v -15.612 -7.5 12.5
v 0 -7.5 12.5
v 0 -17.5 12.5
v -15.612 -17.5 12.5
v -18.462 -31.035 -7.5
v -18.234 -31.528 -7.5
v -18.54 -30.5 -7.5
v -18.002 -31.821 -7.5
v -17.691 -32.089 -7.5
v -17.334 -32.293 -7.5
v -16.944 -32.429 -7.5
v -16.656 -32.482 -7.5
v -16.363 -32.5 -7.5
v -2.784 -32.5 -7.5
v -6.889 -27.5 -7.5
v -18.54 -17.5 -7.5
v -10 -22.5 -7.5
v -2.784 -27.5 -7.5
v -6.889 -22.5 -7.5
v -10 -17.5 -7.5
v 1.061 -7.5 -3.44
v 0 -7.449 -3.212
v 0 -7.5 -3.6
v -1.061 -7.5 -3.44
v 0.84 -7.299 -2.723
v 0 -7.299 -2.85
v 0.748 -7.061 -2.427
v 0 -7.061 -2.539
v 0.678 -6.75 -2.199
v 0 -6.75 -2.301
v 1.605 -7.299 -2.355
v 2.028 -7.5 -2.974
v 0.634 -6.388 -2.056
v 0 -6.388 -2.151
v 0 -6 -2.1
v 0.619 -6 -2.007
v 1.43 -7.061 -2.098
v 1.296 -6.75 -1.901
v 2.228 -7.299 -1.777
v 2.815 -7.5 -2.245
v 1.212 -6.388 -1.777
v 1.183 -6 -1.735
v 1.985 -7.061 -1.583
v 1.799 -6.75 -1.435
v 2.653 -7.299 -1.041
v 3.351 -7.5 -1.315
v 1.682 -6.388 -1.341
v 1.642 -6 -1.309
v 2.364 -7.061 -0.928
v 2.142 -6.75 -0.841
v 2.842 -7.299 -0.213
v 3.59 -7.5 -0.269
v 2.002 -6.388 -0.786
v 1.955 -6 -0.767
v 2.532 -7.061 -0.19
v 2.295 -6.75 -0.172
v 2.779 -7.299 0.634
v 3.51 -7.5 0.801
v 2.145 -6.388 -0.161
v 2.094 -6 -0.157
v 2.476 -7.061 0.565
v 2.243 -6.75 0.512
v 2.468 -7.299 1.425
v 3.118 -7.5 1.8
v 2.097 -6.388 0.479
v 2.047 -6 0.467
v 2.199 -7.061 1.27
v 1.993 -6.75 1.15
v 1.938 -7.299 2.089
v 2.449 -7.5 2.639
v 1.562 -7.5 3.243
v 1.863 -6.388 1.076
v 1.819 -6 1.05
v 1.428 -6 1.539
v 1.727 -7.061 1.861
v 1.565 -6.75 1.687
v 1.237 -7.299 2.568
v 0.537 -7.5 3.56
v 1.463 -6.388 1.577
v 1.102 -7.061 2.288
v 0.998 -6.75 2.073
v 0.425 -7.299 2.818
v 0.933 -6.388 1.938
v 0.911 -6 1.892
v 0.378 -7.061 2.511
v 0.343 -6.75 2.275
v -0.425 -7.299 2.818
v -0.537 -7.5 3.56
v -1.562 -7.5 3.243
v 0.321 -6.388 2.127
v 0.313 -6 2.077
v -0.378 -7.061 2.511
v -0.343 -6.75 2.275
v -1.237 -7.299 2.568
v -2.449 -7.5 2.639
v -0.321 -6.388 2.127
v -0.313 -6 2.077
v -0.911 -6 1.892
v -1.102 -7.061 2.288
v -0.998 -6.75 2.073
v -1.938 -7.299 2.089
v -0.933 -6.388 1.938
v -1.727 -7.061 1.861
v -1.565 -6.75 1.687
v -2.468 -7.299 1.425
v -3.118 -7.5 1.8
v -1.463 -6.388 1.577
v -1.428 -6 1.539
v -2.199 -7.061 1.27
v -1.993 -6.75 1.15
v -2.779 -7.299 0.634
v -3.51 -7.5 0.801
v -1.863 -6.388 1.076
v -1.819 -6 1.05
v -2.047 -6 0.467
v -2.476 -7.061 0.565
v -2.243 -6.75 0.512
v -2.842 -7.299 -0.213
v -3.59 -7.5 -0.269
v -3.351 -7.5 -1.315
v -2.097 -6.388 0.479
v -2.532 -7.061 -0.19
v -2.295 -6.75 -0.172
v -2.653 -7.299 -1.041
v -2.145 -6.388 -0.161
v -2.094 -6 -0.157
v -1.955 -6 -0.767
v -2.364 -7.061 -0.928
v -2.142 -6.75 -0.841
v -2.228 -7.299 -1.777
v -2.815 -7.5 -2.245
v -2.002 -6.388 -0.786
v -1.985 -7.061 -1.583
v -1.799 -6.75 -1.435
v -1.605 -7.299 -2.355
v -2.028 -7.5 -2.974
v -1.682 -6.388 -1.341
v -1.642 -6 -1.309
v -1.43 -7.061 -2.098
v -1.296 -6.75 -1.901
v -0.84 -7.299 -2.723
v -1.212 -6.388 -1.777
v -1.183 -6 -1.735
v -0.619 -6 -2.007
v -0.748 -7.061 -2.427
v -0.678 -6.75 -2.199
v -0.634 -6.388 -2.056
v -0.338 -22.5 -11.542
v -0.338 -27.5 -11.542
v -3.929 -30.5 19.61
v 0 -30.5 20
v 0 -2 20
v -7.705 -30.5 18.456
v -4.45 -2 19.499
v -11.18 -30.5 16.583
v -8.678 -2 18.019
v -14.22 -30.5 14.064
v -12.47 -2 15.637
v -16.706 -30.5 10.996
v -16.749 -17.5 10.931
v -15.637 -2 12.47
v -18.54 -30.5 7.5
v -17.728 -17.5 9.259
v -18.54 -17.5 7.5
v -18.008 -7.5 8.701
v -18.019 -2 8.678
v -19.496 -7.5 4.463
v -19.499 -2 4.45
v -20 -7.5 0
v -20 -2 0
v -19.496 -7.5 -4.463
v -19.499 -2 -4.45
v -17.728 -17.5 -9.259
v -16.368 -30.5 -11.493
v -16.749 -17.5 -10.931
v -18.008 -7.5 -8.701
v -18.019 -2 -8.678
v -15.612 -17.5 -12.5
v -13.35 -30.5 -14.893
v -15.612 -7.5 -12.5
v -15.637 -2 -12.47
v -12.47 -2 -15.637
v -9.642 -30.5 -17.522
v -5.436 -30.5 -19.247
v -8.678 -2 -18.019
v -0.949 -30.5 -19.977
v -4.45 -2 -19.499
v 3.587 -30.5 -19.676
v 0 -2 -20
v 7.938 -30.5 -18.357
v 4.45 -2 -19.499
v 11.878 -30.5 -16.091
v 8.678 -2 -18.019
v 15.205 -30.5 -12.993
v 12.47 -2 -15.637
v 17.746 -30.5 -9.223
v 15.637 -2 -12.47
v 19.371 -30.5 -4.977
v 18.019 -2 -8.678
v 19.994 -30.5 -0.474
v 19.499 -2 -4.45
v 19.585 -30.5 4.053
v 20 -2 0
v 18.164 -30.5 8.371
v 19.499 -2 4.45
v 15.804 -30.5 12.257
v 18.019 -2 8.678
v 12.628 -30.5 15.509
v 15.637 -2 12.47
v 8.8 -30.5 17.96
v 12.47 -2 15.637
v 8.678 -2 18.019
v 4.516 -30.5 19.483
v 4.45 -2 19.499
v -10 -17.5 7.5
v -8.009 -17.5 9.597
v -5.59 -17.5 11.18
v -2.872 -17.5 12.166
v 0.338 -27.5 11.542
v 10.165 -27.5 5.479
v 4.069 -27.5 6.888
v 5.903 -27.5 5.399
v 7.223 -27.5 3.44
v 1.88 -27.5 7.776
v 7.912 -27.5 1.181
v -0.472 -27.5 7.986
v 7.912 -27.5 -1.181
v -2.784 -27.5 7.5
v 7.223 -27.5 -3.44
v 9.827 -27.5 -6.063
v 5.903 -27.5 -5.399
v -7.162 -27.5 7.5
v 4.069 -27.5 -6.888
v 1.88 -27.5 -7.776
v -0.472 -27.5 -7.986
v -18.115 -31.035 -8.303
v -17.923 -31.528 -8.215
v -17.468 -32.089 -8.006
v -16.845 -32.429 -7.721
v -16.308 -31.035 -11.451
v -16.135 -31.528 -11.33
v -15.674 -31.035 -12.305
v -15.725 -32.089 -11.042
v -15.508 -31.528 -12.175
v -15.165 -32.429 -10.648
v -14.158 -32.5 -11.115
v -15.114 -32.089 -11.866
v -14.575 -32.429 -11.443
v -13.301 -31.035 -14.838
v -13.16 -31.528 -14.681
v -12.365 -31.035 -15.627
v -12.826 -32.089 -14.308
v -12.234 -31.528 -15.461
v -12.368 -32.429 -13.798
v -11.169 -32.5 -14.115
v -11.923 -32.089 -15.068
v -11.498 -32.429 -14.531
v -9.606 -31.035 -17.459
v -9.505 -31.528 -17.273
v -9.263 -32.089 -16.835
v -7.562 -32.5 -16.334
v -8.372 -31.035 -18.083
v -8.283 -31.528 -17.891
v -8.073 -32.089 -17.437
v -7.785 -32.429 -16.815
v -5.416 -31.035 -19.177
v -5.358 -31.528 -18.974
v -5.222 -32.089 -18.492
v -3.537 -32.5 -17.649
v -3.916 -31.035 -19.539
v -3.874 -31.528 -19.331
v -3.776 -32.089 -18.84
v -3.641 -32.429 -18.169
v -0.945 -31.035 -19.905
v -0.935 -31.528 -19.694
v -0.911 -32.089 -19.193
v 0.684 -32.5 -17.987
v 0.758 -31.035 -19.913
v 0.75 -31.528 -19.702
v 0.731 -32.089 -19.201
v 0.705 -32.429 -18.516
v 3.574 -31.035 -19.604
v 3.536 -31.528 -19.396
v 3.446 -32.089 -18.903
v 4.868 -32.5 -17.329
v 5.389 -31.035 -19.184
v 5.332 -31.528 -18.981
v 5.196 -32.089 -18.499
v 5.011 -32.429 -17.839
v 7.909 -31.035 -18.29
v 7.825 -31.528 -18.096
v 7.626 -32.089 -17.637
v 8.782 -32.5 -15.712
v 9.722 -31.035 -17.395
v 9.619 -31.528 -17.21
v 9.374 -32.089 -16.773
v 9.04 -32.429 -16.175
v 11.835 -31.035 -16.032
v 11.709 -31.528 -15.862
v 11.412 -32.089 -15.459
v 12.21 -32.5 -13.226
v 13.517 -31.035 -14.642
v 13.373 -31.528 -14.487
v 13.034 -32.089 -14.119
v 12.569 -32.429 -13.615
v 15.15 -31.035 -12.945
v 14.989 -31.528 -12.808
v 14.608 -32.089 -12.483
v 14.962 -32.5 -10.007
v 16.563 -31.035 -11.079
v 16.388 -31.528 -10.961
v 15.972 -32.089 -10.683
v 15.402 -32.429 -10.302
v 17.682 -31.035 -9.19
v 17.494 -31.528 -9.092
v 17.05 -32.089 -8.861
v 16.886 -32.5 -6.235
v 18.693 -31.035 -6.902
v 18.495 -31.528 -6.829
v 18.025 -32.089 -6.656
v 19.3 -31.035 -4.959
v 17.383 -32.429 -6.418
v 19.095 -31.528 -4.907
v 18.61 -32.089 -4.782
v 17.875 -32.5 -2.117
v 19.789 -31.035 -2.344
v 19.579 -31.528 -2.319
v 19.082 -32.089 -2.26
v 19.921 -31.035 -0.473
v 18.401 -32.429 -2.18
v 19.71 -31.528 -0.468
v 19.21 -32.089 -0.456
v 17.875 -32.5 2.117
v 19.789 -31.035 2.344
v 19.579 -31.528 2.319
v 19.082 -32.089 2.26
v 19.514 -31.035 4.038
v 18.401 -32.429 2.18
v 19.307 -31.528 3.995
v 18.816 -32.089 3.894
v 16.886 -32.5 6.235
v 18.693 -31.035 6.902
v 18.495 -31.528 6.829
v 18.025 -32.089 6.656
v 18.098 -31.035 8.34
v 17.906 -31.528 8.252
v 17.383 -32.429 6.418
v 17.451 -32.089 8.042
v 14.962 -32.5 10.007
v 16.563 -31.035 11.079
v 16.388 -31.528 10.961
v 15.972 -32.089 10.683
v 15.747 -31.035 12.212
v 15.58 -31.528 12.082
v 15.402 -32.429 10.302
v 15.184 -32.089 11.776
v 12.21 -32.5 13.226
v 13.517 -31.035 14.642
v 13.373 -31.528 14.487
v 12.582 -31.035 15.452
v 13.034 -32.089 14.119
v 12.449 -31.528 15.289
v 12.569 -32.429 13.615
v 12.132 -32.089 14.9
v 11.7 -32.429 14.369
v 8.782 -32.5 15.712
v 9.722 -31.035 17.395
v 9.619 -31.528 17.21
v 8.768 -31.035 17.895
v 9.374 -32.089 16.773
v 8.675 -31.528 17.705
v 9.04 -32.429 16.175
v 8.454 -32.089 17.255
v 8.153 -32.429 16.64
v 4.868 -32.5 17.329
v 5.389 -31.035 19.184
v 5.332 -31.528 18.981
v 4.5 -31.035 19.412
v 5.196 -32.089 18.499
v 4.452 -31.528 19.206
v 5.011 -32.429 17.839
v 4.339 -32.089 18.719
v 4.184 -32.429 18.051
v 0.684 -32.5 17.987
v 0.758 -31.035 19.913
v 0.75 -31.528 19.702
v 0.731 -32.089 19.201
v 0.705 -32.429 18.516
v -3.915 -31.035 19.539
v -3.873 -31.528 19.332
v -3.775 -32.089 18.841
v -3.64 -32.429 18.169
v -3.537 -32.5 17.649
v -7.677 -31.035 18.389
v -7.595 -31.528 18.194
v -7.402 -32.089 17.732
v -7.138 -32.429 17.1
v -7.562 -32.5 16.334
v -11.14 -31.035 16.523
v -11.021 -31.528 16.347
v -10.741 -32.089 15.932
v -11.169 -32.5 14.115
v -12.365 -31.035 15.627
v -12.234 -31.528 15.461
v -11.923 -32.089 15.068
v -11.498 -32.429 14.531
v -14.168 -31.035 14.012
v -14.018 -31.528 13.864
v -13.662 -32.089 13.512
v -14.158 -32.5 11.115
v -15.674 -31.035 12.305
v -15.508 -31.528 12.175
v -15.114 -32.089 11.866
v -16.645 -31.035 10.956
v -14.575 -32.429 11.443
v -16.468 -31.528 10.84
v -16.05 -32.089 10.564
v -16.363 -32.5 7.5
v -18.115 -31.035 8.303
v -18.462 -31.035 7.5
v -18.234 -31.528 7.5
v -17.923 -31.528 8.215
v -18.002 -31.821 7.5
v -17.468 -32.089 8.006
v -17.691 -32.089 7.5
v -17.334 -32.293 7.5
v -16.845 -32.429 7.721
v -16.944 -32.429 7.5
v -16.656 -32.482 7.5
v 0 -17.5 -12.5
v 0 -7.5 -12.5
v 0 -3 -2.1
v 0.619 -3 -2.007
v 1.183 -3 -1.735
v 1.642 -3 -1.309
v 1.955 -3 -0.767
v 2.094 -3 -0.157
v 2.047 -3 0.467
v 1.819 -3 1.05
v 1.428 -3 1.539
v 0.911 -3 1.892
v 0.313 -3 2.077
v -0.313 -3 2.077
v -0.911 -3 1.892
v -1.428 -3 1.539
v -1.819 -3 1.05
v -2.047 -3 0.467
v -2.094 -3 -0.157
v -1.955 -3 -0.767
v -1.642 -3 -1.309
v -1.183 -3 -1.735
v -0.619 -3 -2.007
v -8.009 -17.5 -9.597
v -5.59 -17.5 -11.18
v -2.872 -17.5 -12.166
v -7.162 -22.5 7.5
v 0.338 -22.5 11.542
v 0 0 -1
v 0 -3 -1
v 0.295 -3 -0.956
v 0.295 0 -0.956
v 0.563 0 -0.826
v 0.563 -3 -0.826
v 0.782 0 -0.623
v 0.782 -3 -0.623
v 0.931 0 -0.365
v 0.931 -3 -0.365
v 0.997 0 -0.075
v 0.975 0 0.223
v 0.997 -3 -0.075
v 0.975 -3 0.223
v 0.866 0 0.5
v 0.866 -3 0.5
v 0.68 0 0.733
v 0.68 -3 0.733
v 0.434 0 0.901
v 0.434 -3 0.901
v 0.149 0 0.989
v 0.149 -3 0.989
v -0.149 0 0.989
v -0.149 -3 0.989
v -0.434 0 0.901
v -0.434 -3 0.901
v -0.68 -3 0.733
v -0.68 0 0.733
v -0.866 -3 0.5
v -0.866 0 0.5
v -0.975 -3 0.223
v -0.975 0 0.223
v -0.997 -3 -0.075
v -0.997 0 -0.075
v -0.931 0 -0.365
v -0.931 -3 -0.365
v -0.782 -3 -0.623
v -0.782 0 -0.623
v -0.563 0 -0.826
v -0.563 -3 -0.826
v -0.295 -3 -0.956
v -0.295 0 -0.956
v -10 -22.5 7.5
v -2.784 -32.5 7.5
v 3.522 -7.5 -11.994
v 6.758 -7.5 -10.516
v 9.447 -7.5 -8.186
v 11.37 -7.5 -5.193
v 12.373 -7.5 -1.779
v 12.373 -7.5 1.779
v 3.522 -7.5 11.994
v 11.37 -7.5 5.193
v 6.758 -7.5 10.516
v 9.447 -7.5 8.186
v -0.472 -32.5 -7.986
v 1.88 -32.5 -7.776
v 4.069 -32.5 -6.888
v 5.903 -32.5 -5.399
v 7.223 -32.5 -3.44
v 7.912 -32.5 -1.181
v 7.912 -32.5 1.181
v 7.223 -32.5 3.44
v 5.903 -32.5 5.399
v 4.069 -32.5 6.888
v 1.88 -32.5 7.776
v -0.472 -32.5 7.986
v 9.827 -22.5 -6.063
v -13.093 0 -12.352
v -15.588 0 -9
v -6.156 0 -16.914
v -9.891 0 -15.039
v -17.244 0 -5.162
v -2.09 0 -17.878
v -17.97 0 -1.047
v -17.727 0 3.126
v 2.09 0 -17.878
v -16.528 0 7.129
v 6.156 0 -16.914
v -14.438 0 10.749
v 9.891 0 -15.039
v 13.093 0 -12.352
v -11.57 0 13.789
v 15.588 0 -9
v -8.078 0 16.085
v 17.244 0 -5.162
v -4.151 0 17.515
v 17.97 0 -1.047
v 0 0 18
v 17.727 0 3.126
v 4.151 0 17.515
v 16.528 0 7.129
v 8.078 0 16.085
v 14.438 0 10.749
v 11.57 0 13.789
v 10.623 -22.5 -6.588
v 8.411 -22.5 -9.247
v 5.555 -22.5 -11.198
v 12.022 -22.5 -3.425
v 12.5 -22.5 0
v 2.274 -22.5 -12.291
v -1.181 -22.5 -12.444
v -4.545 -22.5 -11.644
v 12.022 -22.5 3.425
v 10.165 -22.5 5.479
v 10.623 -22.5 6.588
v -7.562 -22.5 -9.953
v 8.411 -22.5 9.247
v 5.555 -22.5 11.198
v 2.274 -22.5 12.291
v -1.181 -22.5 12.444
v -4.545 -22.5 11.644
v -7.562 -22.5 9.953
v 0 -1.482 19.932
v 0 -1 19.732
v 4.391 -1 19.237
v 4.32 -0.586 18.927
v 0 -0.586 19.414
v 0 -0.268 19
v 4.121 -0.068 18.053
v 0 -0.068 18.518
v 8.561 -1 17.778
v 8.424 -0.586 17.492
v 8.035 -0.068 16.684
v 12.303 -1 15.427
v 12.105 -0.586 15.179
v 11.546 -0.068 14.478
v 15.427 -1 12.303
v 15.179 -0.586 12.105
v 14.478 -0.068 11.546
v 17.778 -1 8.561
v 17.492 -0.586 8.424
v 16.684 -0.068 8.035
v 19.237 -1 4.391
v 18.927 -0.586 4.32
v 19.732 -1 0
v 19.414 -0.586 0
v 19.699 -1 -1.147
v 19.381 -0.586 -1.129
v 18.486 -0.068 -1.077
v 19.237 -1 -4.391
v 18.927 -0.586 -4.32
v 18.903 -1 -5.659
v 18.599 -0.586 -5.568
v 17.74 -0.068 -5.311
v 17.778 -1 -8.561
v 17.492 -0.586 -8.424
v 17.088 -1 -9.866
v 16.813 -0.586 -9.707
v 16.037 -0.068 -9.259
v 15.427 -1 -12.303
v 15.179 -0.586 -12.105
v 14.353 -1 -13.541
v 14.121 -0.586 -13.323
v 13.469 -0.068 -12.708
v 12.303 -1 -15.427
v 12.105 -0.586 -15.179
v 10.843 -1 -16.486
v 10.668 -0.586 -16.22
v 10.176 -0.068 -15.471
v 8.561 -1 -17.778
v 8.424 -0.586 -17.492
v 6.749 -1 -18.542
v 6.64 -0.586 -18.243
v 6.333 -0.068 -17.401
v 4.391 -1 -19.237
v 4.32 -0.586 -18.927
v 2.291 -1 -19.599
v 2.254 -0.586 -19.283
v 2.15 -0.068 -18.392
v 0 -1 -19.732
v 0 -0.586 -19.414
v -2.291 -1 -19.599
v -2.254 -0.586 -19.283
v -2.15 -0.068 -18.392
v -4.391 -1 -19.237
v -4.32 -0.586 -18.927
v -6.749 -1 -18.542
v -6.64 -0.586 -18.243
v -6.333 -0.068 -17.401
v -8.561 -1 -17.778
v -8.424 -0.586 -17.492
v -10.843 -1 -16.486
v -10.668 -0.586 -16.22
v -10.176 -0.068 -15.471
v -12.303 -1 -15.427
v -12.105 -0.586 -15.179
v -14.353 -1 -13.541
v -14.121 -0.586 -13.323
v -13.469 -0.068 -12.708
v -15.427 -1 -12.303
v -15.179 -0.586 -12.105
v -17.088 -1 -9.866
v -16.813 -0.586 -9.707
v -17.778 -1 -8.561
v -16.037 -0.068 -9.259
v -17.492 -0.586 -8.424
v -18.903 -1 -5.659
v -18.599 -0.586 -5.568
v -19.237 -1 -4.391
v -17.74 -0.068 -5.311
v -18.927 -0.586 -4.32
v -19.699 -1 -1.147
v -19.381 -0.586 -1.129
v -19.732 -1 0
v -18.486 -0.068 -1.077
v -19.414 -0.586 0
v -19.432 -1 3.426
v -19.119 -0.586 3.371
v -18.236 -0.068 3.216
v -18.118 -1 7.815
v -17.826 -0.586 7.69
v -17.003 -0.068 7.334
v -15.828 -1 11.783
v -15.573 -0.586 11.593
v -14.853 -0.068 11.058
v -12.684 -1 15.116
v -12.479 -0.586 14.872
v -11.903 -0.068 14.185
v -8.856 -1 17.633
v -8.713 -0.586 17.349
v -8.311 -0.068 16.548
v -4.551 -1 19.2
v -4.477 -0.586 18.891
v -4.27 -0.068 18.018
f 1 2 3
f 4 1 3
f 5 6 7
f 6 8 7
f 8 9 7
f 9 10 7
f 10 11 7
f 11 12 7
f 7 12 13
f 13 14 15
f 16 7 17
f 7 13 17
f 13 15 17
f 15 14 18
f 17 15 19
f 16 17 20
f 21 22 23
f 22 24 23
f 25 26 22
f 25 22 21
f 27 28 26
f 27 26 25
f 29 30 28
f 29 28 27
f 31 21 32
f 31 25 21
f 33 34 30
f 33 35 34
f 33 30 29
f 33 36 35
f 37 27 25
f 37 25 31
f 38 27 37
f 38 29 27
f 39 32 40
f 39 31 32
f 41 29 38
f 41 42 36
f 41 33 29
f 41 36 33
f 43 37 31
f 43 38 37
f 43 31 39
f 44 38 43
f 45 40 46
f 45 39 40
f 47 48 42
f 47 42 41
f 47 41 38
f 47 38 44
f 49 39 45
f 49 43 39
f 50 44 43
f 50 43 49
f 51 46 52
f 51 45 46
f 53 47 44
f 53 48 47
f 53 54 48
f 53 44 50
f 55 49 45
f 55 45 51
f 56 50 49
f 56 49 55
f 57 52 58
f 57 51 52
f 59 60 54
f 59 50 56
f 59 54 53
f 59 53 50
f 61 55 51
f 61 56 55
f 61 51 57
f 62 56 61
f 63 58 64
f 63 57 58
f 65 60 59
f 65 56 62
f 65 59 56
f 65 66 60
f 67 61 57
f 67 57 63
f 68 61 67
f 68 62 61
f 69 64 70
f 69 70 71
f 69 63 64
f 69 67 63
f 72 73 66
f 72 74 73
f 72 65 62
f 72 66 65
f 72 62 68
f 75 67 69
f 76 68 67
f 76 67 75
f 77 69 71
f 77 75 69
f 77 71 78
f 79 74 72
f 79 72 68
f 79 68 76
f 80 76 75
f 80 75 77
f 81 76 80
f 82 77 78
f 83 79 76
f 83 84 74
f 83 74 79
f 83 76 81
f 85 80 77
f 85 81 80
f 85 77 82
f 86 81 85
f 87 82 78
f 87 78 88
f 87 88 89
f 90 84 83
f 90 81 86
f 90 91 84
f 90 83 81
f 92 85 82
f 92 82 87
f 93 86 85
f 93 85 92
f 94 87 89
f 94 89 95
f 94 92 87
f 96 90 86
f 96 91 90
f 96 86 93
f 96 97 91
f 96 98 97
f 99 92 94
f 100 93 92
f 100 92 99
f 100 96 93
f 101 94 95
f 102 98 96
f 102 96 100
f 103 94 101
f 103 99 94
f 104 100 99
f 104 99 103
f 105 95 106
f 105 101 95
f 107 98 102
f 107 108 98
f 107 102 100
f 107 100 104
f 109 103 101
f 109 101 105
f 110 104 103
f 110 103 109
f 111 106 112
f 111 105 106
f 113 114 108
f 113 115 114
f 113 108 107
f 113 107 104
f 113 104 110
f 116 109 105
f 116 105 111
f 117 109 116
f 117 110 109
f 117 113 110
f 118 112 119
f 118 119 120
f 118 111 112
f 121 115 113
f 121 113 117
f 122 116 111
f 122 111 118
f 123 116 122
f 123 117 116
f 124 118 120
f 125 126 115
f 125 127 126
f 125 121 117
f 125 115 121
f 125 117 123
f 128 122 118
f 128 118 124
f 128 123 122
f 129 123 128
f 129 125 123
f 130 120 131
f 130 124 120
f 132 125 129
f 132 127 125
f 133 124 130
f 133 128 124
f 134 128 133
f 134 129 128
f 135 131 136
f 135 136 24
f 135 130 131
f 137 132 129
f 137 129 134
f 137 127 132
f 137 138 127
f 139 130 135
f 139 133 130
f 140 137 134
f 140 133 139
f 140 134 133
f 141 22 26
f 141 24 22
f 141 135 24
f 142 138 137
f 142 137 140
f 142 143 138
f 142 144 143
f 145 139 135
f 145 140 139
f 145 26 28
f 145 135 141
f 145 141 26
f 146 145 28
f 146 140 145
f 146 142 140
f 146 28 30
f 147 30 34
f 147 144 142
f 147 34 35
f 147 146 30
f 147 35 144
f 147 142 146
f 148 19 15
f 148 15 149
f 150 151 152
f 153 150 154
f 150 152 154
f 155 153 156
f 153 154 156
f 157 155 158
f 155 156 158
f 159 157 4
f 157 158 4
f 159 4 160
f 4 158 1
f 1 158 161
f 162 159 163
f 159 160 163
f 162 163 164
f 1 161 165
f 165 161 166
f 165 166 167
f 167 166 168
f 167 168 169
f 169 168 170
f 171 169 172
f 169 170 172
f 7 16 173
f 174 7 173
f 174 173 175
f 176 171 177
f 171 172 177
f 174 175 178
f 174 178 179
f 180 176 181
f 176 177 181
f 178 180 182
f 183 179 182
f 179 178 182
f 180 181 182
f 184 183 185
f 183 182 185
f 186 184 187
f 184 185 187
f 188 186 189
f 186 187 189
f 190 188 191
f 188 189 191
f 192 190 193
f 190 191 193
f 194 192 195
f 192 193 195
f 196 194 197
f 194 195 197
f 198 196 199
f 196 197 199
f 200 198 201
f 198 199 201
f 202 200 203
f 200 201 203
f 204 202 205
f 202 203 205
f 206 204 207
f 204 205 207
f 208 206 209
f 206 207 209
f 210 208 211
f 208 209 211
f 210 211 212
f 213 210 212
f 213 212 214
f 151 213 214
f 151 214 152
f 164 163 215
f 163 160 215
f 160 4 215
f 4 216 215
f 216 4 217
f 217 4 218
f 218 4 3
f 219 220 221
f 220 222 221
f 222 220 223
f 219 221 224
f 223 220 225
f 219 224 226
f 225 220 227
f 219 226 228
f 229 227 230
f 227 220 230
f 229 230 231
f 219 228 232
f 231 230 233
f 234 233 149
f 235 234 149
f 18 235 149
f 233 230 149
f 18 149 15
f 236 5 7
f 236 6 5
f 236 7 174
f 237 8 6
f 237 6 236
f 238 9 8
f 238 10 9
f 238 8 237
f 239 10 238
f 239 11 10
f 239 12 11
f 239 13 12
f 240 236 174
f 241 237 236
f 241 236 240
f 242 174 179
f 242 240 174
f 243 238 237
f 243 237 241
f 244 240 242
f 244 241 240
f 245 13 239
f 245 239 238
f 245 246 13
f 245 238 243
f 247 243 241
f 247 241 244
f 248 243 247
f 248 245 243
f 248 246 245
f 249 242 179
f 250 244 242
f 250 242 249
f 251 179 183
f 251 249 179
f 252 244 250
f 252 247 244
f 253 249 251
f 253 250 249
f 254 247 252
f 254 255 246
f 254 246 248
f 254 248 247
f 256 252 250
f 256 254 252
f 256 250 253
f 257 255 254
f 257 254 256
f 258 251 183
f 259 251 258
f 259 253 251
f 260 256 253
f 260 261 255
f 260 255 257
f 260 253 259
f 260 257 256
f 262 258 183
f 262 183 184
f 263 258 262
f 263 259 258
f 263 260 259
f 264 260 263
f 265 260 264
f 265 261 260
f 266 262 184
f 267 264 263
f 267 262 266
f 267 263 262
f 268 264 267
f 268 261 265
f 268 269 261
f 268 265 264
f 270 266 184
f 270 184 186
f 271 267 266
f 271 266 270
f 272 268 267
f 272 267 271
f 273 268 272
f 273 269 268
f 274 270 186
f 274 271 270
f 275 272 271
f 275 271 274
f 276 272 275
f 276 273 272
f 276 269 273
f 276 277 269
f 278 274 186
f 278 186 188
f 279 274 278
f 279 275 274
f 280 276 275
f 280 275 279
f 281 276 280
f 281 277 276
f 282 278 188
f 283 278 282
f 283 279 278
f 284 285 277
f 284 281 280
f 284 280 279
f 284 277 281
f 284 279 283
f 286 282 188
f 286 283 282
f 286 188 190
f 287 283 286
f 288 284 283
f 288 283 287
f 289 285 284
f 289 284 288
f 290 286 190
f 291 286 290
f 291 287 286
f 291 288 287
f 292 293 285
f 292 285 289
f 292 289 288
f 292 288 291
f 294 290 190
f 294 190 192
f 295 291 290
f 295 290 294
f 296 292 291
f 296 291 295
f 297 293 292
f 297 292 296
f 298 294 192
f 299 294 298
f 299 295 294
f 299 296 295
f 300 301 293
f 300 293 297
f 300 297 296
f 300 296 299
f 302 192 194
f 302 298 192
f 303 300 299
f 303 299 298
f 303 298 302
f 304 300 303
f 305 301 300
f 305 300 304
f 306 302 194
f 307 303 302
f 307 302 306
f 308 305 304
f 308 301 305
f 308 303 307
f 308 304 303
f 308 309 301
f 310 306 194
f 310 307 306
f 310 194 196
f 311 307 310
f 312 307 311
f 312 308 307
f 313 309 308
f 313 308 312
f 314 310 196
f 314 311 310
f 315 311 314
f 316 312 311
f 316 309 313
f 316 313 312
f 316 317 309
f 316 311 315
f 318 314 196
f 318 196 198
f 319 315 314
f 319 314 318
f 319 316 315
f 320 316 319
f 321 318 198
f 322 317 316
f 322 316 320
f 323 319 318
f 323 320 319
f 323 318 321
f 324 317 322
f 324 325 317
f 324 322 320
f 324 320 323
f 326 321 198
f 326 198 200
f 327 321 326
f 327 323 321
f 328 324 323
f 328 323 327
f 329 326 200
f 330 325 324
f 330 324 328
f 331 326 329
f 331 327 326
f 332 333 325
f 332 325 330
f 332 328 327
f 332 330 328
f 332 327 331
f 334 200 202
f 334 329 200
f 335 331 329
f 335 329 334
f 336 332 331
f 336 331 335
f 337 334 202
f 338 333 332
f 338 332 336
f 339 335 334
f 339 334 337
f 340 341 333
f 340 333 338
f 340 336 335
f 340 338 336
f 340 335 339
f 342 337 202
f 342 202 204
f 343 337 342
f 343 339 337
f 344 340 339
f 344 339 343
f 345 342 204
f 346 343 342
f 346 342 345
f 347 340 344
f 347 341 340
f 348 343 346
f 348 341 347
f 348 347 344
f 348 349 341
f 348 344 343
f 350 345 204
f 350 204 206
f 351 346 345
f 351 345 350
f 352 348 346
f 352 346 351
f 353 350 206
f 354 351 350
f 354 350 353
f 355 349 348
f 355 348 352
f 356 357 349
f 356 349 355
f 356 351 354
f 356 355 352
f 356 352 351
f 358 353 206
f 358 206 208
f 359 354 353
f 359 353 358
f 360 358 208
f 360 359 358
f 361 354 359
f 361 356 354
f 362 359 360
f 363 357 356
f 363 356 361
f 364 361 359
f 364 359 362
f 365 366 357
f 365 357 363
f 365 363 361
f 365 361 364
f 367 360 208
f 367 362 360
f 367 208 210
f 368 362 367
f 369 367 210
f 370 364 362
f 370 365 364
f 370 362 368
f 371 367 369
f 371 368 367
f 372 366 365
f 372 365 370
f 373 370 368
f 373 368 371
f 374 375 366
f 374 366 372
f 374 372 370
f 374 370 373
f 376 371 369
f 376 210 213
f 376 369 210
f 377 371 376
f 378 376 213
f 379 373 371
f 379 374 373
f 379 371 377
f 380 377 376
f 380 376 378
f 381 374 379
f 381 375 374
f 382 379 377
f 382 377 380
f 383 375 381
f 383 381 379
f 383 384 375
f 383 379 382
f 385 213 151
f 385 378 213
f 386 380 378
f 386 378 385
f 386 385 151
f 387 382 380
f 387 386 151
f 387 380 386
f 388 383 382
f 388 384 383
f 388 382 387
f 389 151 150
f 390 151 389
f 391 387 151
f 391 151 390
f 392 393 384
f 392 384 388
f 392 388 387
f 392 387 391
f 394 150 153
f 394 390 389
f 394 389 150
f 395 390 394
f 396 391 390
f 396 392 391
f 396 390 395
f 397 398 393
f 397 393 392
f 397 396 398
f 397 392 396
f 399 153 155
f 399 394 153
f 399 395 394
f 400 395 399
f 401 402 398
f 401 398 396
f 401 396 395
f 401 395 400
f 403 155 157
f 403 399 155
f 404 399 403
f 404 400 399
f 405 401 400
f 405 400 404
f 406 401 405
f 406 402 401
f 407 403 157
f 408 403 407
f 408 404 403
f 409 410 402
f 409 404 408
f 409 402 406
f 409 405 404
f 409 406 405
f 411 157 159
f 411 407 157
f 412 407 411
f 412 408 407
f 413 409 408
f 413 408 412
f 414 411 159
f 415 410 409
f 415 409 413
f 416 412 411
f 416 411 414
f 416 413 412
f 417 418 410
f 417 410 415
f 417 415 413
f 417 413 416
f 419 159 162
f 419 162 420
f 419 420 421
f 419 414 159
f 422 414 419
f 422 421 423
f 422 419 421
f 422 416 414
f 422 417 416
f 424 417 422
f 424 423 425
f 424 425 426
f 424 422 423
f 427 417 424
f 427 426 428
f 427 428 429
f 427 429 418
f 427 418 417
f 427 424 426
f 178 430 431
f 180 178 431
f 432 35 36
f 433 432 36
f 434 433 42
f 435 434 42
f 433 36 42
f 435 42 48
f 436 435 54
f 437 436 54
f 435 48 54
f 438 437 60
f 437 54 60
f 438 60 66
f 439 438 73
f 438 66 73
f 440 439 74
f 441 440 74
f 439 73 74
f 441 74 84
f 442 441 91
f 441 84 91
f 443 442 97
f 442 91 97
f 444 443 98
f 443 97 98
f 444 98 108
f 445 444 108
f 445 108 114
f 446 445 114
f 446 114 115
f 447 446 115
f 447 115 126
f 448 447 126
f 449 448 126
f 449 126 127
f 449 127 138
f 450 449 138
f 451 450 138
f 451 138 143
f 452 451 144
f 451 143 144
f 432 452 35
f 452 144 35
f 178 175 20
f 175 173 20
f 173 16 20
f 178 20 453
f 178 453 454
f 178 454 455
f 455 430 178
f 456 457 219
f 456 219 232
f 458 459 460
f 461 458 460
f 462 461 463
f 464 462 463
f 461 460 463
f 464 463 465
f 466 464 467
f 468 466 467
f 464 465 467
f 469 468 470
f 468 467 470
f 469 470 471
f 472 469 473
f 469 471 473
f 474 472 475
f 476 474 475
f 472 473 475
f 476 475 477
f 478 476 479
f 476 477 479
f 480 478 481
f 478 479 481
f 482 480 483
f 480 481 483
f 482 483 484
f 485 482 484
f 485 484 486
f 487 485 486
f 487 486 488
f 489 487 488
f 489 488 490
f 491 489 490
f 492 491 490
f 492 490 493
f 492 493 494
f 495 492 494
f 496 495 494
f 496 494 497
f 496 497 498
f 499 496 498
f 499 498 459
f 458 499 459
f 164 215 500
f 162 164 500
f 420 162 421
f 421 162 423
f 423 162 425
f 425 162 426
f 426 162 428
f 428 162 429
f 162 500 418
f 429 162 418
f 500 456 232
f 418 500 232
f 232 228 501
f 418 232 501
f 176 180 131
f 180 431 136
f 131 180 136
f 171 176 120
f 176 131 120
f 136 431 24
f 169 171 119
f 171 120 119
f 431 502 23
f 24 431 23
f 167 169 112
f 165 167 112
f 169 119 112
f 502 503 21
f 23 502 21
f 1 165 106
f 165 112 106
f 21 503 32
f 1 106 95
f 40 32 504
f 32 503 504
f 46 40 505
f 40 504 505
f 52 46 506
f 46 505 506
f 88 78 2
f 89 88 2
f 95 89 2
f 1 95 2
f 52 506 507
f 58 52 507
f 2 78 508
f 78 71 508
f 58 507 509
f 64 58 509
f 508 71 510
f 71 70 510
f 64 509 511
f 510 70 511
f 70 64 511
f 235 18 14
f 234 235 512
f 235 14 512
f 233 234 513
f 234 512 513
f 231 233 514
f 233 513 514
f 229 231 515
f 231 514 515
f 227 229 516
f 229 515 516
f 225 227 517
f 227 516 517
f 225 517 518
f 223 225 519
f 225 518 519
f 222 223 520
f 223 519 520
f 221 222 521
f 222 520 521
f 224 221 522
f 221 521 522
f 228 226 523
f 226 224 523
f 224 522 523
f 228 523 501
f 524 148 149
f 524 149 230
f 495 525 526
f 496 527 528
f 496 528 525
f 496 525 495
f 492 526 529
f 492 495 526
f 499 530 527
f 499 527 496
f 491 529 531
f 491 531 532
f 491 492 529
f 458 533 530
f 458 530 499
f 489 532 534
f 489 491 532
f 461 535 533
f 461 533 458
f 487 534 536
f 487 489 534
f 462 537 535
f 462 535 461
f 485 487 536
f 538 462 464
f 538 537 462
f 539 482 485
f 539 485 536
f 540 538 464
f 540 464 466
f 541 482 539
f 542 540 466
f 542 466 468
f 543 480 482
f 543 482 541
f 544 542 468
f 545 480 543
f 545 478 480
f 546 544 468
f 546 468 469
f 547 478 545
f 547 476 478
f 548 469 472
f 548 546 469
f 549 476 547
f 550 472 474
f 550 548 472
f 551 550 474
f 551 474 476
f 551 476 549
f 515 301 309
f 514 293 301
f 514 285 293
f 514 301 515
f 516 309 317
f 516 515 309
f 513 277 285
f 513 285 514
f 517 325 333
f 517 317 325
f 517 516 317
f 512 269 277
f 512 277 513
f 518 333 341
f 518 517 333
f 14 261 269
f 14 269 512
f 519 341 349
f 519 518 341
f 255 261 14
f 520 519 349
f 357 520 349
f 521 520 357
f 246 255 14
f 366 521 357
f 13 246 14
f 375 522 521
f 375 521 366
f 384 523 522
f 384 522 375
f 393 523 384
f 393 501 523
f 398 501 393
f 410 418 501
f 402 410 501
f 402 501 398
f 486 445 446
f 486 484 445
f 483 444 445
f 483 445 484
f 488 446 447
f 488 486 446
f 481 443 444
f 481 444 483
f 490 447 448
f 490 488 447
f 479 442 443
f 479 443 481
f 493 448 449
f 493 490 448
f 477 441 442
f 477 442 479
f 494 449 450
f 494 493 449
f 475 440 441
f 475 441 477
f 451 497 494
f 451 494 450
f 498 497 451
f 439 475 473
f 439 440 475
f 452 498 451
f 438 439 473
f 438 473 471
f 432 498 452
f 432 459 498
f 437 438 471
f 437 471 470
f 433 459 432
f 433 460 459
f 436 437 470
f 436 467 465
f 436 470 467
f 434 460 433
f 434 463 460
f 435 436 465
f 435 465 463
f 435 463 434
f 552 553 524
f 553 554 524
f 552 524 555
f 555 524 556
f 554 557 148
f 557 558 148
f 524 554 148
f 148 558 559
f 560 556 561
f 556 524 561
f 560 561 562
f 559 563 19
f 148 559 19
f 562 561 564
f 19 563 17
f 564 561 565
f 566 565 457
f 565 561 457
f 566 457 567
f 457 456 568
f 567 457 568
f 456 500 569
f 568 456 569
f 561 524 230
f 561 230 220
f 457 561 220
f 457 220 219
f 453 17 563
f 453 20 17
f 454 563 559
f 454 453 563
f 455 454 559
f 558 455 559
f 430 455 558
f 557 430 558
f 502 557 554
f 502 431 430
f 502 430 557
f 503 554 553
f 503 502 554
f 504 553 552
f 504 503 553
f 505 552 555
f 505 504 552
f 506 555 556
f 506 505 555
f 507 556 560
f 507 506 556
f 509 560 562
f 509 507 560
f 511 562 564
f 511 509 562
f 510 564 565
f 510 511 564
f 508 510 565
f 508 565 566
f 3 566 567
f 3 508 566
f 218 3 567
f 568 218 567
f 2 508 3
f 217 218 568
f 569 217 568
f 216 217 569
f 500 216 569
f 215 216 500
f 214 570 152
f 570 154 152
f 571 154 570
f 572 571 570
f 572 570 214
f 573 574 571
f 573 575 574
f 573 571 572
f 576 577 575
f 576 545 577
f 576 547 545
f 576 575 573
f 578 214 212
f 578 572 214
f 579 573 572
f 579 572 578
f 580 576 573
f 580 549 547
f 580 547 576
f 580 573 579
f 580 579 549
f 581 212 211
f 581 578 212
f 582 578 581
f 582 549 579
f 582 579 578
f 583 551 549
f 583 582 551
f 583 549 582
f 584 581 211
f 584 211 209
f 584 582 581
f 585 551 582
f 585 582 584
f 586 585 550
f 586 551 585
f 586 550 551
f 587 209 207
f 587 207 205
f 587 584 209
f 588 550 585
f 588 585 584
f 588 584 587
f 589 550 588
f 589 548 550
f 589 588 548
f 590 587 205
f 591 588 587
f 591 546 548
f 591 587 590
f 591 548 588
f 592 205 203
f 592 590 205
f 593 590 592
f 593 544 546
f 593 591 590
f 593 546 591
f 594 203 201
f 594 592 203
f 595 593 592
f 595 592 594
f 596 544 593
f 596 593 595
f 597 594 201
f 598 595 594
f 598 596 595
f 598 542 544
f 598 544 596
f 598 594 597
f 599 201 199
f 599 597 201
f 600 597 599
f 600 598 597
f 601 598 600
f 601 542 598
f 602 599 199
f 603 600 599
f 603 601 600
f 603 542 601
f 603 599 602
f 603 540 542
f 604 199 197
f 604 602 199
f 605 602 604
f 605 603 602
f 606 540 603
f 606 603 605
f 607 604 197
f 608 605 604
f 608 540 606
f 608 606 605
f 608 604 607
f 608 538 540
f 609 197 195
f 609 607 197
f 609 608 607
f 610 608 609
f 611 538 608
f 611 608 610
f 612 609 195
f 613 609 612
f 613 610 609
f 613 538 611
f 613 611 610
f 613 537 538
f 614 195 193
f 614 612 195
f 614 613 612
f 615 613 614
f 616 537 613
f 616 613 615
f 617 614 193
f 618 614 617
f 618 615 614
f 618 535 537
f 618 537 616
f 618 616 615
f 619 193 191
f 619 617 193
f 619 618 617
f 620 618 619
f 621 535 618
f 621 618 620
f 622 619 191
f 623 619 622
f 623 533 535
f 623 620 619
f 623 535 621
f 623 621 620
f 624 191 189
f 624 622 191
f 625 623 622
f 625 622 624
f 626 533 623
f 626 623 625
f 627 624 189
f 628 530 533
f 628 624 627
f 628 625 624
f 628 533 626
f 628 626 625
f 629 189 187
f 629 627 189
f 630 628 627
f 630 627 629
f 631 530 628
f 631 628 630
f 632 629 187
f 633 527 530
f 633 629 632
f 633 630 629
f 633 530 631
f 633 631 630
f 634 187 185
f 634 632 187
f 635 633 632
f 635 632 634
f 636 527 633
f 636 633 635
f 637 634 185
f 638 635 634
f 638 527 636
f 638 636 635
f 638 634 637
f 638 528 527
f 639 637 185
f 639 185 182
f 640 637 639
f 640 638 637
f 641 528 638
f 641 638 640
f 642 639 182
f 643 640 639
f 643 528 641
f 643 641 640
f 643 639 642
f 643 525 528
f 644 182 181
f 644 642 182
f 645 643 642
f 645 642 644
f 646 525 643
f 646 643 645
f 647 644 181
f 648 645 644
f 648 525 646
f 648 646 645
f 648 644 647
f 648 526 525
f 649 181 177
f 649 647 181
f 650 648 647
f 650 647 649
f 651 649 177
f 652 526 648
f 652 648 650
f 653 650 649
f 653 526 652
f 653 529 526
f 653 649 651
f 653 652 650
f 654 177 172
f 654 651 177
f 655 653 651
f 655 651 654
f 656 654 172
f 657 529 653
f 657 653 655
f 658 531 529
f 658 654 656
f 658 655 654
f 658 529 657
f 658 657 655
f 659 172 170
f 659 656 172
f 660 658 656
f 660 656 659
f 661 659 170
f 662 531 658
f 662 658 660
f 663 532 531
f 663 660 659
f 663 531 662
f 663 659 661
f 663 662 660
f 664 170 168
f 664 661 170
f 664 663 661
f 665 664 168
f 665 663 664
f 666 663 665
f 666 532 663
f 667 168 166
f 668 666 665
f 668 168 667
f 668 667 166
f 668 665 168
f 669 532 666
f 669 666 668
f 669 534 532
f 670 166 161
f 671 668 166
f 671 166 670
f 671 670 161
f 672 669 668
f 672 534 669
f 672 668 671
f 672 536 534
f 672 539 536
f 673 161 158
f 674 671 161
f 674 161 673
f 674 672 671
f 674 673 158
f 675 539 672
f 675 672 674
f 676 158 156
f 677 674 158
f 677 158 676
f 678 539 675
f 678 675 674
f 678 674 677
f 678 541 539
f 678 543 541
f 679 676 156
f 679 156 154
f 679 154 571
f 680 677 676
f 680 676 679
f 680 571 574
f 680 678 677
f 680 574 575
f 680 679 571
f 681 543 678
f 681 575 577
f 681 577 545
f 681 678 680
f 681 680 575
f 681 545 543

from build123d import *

# Parameters (mm, degrees)
SKETCH1_R           = 20
BOSS_EXTRUDE1_DEPTH = 7.5
SKETCH2_R           = 20
SKETCH2_R_2         = 12.5
BOSS_EXTRUDE2_DEPTH = 15
SKETCH3_R           = 20
BOSS_EXTRUDE3_DEPTH = 10
CUT_EXTRUDE2_DEPTH  = 5
CUT_EXTRUDE3_DEPTH  = 44.084219849
SKETCH6_R           = 8
CUT_EXTRUDE4_DEPTH  = 5
SKETCH7_R           = 2.1
CUT_EXTRUDE5_DEPTH  = 4.5
SKETCH8_R           = 1
CUT_EXTRUDE6_DEPTH  = 41.868692174
FILLET1_R           = 1.5
FILLET2_R           = 2


with BuildPart() as part:
    # Sketch1 → Boss-Extrude1 (new body)
    with BuildSketch(Plane(origin=(0, 0, 0), x_dir=(1, 0, 0), z_dir=(0, 1, 0))):
        with Locations(Location((0, 0, 0), (0, 0, 270))):
            Circle(SKETCH1_R)
    extrude(amount=-BOSS_EXTRUDE1_DEPTH)

    # Sketch2 → Boss-Extrude2 (add)
    with BuildSketch(Plane.XZ.offset(7.5)):
        with Locations(Location((0, 0, 0), (0, 0, 90))):
            Circle(SKETCH2_R)
        with Locations(Location((0, 0, 0), (0, 0, 270))):
            Circle(SKETCH2_R_2, mode=Mode.SUBTRACT)
    extrude(amount=BOSS_EXTRUDE2_DEPTH)

    # Sketch3 → Boss-Extrude3 (add)
    with BuildSketch(Plane.XZ.offset(22.5)):
        with Locations(Location((0, 0, 0), (0, 0, 90))):
            Circle(SKETCH3_R)
    extrude(amount=BOSS_EXTRUDE3_DEPTH)

    # Sketch4 → Cut-Extrude2 (cut)
    with BuildSketch(Plane(origin=(0, -22.5, 0), x_dir=(-1, 0, 0), z_dir=(0, -1, 0))):
        Polygon((10.164510853, 5.47869076), (0.337570049, 11.542069996), (-9.826940805, 6.063379236), (-10.164510853, -5.47869076), (-0.337570049, -11.542069996), (9.826940805, -6.063379236), align=None)
    extrude(amount=CUT_EXTRUDE2_DEPTH, mode=Mode.SUBTRACT)

    # Sketch5 → Cut-Extrude3 (cut, through all)
    with BuildSketch(Plane(origin=(0, 0, 0), x_dir=(0, 0, -1), z_dir=(1, 0, 0))):
        Polygon((7.5, -17.5), (12.5, -17.5), (12.5, -7.5), (-12.5, -7.5), (-12.5, -17.5), (-7.5, -17.5), (-7.5, -32.5), (7.5, -32.5), align=None)
    extrude(amount=-CUT_EXTRUDE3_DEPTH, mode=Mode.SUBTRACT)

    # Sketch6 → Cut-Extrude4 (cut)
    with BuildSketch(Plane.XZ.offset(32.5)):
        Circle(SKETCH6_R)
    extrude(amount=-CUT_EXTRUDE4_DEPTH, mode=Mode.SUBTRACT)

    # Sketch7 → Cut-Extrude5 (cut)
    with BuildSketch(Plane.XZ.offset(7.5)):
        with Locations(Location((0, 0, 0), (0, 0, 270))):
            Circle(SKETCH7_R)
    extrude(amount=-CUT_EXTRUDE5_DEPTH, mode=Mode.SUBTRACT)

    # Sketch8 → Cut-Extrude6 (cut, through all)
    with BuildSketch(Plane.XZ.offset(3)):
        with Locations(Location((0, 0, 0), (0, 0, 270))):
            Circle(SKETCH8_R)
    extrude(amount=-CUT_EXTRUDE6_DEPTH, mode=Mode.SUBTRACT)

    # Fillet1
    fillet1_edges = [part.edges().sort_by_distance(p)[0] for p in [
        (0, -7.5, 2.1),
    ]]
    fillet(fillet1_edges, radius=FILLET1_R)

    # Fillet2
    fillet2_edges = [part.edges().sort_by_distance(p)[0] for p in [
        (0, 0, -20),
        (16.583123952, -32.5, -11.180339887),
    ]]
    fillet(fillet2_edges, radius=FILLET2_R)


solid = part.part
